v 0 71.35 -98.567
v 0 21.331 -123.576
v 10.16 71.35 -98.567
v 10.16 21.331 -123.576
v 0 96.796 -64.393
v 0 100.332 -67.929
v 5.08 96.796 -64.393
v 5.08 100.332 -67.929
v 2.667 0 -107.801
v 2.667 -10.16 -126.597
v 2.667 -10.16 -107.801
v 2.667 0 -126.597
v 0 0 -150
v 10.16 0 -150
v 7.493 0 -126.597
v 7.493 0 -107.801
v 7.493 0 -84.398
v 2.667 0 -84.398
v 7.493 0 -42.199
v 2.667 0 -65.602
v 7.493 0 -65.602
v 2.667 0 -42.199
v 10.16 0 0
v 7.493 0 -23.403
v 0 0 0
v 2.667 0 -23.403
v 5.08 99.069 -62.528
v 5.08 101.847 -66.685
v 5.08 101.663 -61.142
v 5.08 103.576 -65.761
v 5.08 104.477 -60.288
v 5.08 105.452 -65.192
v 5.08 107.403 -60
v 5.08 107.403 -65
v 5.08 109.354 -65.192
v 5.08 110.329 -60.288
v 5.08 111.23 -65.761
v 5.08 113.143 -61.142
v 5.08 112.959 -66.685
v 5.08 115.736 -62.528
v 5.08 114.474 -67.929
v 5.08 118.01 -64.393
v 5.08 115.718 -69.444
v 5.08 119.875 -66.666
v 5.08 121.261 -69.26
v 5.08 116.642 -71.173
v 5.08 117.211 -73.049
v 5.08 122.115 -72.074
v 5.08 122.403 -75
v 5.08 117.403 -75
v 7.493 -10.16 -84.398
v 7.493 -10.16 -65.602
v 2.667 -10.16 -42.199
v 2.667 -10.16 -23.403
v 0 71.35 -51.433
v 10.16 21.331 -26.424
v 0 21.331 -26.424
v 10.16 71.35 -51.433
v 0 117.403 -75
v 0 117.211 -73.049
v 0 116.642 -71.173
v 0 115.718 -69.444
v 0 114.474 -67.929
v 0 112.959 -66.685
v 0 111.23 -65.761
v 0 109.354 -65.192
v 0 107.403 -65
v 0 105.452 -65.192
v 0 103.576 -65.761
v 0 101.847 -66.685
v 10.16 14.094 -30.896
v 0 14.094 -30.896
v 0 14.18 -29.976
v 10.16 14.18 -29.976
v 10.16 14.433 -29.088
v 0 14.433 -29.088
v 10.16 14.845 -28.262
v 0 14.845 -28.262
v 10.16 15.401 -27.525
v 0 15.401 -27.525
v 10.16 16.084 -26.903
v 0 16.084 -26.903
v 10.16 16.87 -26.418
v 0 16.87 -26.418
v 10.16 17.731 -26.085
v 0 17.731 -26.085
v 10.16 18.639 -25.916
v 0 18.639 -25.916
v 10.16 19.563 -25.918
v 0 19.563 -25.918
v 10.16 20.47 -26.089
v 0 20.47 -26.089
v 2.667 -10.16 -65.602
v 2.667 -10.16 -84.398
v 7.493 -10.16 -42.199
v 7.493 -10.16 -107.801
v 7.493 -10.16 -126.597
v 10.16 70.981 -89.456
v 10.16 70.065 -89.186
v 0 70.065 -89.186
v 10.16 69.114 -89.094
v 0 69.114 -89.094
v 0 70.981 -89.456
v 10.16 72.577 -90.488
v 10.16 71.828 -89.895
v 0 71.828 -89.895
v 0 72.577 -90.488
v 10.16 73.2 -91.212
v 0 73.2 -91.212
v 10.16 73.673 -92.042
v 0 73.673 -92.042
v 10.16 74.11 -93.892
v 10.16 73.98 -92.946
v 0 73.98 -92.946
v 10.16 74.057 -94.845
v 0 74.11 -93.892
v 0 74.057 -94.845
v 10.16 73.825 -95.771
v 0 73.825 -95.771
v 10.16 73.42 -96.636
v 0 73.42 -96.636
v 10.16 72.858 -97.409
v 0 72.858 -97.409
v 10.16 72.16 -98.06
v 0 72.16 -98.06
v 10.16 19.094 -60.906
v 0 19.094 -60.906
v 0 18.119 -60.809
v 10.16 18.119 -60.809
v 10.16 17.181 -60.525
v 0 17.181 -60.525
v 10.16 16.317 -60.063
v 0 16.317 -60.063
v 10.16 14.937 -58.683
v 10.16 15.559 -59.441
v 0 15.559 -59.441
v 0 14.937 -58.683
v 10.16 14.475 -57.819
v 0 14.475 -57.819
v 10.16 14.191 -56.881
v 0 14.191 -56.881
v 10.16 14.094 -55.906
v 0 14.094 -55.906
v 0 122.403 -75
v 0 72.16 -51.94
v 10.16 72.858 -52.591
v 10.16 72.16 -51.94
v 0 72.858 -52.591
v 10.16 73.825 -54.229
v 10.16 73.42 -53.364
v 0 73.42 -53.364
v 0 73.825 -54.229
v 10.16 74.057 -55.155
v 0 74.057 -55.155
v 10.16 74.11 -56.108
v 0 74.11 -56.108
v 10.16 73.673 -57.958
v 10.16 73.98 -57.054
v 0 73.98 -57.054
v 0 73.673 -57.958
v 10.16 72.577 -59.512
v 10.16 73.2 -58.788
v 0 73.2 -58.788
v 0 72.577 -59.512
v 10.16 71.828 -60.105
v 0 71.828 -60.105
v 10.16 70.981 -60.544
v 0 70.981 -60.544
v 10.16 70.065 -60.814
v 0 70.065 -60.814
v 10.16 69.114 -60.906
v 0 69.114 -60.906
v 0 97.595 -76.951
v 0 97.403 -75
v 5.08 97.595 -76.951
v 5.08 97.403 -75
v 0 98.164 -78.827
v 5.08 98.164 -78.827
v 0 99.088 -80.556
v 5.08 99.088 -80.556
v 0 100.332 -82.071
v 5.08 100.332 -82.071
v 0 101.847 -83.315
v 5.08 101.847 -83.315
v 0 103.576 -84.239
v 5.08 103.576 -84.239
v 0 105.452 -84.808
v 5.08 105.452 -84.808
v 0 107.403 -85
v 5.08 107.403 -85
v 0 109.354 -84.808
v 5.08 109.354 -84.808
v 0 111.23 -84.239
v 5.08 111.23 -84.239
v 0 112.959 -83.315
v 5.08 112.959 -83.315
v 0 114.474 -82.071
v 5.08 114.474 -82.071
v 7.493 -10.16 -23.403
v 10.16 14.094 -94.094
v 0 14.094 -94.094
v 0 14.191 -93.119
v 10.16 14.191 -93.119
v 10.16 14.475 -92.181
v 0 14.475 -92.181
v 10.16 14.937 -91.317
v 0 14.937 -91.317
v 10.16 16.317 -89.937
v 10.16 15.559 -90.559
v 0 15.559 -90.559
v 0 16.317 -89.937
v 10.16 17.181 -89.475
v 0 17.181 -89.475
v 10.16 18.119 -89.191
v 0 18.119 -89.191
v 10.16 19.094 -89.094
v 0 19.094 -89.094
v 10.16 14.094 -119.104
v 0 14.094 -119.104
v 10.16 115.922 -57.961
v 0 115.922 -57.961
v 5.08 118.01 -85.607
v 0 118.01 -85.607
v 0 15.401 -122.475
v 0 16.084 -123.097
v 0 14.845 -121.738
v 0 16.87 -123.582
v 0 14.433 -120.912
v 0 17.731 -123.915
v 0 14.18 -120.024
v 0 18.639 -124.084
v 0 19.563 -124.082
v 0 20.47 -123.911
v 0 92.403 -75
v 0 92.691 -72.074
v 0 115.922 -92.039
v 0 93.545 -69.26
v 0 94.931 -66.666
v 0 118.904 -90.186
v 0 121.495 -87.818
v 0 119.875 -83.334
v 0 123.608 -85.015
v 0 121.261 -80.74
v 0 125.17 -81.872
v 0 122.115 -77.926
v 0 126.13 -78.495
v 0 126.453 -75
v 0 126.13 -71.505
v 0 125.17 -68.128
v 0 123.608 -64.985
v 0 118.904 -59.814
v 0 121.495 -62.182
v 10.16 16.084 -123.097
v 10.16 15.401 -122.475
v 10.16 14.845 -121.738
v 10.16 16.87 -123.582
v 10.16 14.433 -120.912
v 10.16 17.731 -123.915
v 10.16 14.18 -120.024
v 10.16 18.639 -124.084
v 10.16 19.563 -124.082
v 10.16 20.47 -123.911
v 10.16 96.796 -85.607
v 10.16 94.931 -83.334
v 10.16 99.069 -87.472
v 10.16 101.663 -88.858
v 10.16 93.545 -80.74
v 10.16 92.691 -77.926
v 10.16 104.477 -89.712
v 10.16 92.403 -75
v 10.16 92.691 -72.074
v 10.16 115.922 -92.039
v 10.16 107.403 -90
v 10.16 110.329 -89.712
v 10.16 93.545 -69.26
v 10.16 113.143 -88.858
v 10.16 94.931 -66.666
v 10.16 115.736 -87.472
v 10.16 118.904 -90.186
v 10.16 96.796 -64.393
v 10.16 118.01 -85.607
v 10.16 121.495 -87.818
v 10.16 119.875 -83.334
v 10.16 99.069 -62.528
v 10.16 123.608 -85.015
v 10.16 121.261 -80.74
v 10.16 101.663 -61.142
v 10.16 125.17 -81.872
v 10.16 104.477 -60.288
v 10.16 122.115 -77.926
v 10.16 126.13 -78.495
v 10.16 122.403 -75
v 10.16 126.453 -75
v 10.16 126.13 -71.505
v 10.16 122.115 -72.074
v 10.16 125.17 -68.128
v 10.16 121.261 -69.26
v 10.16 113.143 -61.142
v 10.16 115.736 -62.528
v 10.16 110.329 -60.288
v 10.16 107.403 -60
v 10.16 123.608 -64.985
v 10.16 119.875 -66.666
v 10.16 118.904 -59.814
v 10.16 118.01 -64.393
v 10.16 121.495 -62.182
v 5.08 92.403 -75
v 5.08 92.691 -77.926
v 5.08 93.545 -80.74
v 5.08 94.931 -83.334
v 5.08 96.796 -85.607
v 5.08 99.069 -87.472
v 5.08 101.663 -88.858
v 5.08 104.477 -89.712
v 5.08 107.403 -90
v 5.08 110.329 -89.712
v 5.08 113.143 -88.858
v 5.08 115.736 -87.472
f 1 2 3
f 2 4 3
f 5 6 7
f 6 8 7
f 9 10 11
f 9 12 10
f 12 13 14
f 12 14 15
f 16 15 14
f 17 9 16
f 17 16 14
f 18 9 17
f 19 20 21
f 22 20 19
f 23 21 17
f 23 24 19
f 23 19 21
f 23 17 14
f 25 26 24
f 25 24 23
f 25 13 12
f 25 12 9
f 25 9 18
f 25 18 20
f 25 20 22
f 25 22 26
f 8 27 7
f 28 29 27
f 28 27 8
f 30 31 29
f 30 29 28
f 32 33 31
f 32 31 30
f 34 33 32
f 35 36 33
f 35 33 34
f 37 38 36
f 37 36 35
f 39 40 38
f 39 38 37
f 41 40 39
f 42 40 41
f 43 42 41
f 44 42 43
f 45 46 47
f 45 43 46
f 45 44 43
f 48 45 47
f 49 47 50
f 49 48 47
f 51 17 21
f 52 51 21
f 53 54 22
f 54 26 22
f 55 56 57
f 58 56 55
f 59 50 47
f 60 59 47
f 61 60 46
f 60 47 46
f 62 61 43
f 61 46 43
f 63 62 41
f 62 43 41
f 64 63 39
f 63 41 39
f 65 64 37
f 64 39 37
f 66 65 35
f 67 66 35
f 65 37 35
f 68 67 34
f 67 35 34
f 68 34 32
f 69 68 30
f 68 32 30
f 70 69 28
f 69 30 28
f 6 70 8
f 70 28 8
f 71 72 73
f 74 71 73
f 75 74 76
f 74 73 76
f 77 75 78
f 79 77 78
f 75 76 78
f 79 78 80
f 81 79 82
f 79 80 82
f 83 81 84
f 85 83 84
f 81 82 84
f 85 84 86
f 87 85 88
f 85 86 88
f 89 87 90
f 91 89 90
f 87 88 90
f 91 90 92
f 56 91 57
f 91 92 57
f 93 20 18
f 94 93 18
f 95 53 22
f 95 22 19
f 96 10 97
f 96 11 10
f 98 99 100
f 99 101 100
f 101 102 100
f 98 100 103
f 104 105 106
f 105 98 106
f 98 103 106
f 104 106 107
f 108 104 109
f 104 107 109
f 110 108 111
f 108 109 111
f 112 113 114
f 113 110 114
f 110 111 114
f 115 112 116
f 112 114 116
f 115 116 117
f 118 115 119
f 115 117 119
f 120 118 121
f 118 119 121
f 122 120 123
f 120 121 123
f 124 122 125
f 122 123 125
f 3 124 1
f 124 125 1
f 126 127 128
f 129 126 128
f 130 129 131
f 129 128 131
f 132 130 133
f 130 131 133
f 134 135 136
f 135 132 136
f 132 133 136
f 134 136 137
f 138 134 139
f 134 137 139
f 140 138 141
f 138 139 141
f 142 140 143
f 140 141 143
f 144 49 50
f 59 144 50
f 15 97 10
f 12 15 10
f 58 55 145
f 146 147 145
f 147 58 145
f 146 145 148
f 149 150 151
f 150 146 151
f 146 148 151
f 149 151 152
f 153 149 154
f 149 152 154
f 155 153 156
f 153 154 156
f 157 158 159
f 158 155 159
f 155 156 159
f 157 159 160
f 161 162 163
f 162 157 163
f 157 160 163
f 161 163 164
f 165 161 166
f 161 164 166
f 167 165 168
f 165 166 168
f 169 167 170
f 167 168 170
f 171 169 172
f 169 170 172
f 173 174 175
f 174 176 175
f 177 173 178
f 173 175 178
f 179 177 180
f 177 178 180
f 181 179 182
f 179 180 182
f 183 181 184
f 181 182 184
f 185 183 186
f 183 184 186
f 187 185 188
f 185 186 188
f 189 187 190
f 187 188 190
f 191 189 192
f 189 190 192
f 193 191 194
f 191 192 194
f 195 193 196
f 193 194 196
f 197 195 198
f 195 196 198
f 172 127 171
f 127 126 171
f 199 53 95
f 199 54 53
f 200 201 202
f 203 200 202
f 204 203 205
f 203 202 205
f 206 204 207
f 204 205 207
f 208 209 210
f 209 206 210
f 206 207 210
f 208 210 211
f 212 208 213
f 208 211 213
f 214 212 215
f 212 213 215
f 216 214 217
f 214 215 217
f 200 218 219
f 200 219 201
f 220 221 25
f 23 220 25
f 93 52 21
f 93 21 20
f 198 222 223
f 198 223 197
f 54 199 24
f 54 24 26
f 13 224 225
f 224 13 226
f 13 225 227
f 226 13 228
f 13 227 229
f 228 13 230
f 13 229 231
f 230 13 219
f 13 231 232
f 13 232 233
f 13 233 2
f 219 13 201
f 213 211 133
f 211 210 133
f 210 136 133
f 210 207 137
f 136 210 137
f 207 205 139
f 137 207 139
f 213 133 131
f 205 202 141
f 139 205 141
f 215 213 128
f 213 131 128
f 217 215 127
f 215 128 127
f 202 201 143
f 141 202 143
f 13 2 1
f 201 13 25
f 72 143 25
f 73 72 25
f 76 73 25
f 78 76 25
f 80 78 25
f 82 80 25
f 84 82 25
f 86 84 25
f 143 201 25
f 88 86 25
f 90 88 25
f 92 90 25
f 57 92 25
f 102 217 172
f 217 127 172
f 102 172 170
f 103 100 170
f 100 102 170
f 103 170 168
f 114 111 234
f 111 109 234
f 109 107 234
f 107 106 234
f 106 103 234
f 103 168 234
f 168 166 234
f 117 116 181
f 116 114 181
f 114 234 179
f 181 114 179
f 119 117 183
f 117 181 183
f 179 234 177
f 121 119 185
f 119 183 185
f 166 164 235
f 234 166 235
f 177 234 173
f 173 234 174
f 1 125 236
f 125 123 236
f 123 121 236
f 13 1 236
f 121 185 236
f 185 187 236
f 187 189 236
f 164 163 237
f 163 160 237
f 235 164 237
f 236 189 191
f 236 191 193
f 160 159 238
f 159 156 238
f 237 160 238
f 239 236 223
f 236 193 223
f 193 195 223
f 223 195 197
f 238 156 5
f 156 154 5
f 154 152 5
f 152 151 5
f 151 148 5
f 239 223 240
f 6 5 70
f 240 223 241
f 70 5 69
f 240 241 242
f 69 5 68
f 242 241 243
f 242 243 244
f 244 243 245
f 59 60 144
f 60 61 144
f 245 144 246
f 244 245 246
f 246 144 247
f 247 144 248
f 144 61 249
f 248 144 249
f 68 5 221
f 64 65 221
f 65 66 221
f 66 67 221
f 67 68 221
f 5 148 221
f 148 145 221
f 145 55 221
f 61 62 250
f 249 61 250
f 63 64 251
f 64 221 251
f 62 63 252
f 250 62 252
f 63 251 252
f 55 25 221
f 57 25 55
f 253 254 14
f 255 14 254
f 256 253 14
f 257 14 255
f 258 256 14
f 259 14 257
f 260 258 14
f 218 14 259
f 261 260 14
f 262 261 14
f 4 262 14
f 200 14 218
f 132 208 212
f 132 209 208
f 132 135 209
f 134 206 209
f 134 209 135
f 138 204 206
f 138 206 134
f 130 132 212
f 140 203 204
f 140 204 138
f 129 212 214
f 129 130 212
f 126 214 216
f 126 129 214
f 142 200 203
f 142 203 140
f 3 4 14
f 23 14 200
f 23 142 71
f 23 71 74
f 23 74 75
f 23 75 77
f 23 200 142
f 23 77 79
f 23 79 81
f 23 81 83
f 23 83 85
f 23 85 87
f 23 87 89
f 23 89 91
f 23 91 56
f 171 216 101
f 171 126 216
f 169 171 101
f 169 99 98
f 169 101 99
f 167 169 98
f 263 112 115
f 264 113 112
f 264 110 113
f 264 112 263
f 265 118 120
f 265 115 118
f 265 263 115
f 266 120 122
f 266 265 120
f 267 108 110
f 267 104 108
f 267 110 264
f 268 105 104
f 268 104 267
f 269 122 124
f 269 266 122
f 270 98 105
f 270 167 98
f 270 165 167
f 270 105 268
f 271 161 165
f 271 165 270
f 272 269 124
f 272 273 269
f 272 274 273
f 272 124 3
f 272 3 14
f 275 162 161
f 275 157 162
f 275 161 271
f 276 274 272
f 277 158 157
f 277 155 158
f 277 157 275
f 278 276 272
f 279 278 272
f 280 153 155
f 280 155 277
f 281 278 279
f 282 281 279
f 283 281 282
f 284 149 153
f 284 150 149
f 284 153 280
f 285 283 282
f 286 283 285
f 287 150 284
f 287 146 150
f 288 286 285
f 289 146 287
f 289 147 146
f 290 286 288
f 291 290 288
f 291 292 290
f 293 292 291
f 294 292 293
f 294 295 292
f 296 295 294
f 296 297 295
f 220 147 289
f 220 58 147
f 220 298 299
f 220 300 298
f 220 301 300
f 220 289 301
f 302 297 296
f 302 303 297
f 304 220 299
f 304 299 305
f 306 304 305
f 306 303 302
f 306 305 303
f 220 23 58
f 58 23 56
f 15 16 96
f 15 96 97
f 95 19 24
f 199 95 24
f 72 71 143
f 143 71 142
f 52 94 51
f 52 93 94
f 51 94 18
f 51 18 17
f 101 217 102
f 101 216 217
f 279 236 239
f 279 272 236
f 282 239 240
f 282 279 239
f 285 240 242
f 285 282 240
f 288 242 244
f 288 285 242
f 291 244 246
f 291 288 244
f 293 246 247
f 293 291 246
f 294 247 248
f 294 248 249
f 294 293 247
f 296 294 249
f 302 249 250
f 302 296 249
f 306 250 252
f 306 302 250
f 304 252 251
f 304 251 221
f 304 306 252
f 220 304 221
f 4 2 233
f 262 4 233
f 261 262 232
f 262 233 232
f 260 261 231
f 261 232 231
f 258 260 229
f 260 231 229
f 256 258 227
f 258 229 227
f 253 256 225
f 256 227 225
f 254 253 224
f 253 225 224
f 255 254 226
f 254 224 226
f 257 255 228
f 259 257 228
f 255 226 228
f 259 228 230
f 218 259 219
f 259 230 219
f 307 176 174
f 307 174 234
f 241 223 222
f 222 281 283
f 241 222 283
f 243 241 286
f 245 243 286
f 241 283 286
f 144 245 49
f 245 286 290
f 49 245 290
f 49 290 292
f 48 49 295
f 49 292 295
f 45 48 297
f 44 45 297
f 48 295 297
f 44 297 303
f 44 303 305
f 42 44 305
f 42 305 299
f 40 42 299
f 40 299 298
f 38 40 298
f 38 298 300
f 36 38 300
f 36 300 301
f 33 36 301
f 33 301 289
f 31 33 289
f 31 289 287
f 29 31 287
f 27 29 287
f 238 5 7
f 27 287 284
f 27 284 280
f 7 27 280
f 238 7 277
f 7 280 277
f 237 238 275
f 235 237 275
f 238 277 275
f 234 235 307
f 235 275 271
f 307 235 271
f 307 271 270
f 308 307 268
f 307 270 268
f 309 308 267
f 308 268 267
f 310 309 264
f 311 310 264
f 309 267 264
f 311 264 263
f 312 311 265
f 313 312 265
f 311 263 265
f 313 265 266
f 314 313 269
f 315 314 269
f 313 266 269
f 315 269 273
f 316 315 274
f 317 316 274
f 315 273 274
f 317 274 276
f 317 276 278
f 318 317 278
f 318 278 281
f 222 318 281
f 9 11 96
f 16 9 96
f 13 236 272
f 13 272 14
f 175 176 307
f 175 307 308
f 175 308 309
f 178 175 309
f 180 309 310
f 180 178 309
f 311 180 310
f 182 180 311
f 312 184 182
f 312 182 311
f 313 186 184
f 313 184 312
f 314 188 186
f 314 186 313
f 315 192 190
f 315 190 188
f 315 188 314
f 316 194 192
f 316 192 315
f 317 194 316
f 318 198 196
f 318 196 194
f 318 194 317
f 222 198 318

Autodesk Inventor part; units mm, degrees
ref_plane "YZ Plane" through (0, 0, 0) normal (1, 0, 0) x (0, 1, 0)
ref_plane "XZ Plane" through (0, 0, 0) normal (0, 1, 0) x (-1, 0, 0)
ref_plane "XY Plane" through (0, 0, 0) normal (0, 0, 1) x (1, 0, 0)
sketch "Sketch1" plane through (0, 0, 0) normal (1, 0, 0) x (0, 1, 0)
  line L0 (150, -75) -> (0, 0)
  line L1 (150, -75) -> (0, -150)
  line L2 (0, -150) -> (0, 0)
  dimension "d0" = 150
  dimension "d1" = 75
extrude "Extrusion1" add sketch "Sketch1" along normal blind 10.16
sketch "Sketch2" plane through (10.16, 0, 0) normal (1, 0, 0) x (0, 0, -1)
  point P0 (0, 0)
fillet "Fillet1" radius 19.05 1 edges at (5.08, 150, -75)
sketch "Sketch3" plane through (10.16, 0, 0) normal (1, 0, 0) x (0, 0, -1)
  arc A0 (92.0388, 115.9223) -> (57.9612, 115.9223) centre (75, 107.4029) ccw projected
  circle A1 centre (75, 107.4029) radius 15
  circle A2 centre (75, 107.4029) radius 10
  line L0 (75, 122.4029) -> (75, 117.4029)
  line L1 (75, 97.4029) -> (75, 92.4029)
  line L2 (85.6066, 118.0095) -> (82.0711, 114.474)
  line L3 (67.9289, 100.3318) -> (64.3934, 96.7963)
  point P0 (0, 0)
  dimension "d5" = 30
  dimension "d34" = 20
  dimension "d35" = 45
  dimension "d36" = 45
sketch "Sketch4" plane through (10.16, 0, 0) normal (1, 0, 0) x (0, 0, -1)
  line L0 (22.8055, 14.0945) -> (60.9055, 90.2945)
  line L1 (57.9612, 115.9223) -> (0, 0) projected
  line L2 (22.8055, 14.0945) -> (60.9055, 14.0945)
  line L3 (60.9055, 14.0945) -> (60.9055, 90.2945)
  line L4 (0, 0) -> (150, 0) construction
  line L5 (0, 0) -> (150, 0) construction
  arc A0 (92.0388, 115.9223) -> (57.9612, 115.9223) centre (75, 107.4029) ccw construction
  line L6 (75, 126.4529) -> (75, 0) construction
  line L7 (127.1945, 14.0945) -> (89.0945, 90.2945)
  line L8 (127.1945, 14.0945) -> (89.0945, 14.0945)
  line L9 (89.0945, 14.0945) -> (89.0945, 90.2945)
  dimension "d8" = 76.2
  dimension "d11" = 14.0945
  dimension "d12" = 14.0945
  dimension "d13" = 14.0945
extrude "Extrusion3" cut sketch "Sketch4" against normal through all
fillet "Fillet2" radius 5 1 edges at (5.08, 14.0945, -127.1945)
fillet "Fillet3" radius 5 2 edges at (5.08, 14.0945, -89.0945) (5.08, 90.2945, -89.0945)
fillet "Fillet4" radius 5 3 edges at (5.08, 14.0945, -60.9055) (5.08, 90.2945, -60.9055) (5.08, 14.0945, -22.8055)
sketch "Sketch6" plane through (0, 0, -150) normal (0, -1, 0) x (1, 0, 0)
  line L0 (10.16, 150) -> (10.16, 0) construction
  line L1 (10.16, 75) -> (0, 75) construction
  line L2 (0, 65) -> (0, 85) construction
  line L3 (7.493, 126.597) -> (2.667, 126.597)
  line L4 (2.667, 126.597) -> (2.667, 107.801)
  line L5 (2.667, 107.801) -> (7.493, 107.801)
  line L6 (7.493, 107.801) -> (7.493, 126.597)
  line L7 (0, 150) -> (0, 0) projected
  line L8 (0, 150) -> (10.16, 150) projected
  line L9 (7.493, 84.398) -> (2.667, 84.398)
  line L10 (2.667, 84.398) -> (2.667, 65.602)
  line L11 (2.667, 65.602) -> (7.493, 65.602)
  line L12 (7.493, 65.602) -> (7.493, 84.398)
  line L13 (7.493, 23.403) -> (2.667, 23.403)
  line L14 (2.667, 23.403) -> (2.667, 42.199)
  line L15 (2.667, 42.199) -> (7.493, 42.199)
  line L16 (7.493, 42.199) -> (7.493, 23.403)
  dimension "d22" = 4.826
  dimension "d23" = 2.667
  dimension "d24" = 2.667
  dimension "d25" = 18.796
  dimension "d26" = 23.403
  dimension "d27" = 18.796
  dimension "d29" = 4.826
  dimension "d30" = 2.667
  dimension "d31" = 2.667
  dimension "d41" = 23.403
extrude "Extrusion5" add sketch "Sketch6" along normal blind 10.16
extrude "Extrusion6" cut sketch "Sketch3" against normal through all contours L2 A2 L0 A1 | A1 L3 A2 L1 | A2
extrude "Extrusion7" cut sketch "Sketch3" against normal blind 5.08 contours A1 L1 A2 L2 | L0 A2 L3 A1
equation "\"d11\" = d13"
equation "\"d12\" = d11"
equation "\"d23\" = d24"
equation "\"d26\" = d41"
equation "\"d27\" = d25"
equation "\"d29\" = d22"
equation "\"d30\" = d23"
properties part number "spool holder arm" material "PLA"
